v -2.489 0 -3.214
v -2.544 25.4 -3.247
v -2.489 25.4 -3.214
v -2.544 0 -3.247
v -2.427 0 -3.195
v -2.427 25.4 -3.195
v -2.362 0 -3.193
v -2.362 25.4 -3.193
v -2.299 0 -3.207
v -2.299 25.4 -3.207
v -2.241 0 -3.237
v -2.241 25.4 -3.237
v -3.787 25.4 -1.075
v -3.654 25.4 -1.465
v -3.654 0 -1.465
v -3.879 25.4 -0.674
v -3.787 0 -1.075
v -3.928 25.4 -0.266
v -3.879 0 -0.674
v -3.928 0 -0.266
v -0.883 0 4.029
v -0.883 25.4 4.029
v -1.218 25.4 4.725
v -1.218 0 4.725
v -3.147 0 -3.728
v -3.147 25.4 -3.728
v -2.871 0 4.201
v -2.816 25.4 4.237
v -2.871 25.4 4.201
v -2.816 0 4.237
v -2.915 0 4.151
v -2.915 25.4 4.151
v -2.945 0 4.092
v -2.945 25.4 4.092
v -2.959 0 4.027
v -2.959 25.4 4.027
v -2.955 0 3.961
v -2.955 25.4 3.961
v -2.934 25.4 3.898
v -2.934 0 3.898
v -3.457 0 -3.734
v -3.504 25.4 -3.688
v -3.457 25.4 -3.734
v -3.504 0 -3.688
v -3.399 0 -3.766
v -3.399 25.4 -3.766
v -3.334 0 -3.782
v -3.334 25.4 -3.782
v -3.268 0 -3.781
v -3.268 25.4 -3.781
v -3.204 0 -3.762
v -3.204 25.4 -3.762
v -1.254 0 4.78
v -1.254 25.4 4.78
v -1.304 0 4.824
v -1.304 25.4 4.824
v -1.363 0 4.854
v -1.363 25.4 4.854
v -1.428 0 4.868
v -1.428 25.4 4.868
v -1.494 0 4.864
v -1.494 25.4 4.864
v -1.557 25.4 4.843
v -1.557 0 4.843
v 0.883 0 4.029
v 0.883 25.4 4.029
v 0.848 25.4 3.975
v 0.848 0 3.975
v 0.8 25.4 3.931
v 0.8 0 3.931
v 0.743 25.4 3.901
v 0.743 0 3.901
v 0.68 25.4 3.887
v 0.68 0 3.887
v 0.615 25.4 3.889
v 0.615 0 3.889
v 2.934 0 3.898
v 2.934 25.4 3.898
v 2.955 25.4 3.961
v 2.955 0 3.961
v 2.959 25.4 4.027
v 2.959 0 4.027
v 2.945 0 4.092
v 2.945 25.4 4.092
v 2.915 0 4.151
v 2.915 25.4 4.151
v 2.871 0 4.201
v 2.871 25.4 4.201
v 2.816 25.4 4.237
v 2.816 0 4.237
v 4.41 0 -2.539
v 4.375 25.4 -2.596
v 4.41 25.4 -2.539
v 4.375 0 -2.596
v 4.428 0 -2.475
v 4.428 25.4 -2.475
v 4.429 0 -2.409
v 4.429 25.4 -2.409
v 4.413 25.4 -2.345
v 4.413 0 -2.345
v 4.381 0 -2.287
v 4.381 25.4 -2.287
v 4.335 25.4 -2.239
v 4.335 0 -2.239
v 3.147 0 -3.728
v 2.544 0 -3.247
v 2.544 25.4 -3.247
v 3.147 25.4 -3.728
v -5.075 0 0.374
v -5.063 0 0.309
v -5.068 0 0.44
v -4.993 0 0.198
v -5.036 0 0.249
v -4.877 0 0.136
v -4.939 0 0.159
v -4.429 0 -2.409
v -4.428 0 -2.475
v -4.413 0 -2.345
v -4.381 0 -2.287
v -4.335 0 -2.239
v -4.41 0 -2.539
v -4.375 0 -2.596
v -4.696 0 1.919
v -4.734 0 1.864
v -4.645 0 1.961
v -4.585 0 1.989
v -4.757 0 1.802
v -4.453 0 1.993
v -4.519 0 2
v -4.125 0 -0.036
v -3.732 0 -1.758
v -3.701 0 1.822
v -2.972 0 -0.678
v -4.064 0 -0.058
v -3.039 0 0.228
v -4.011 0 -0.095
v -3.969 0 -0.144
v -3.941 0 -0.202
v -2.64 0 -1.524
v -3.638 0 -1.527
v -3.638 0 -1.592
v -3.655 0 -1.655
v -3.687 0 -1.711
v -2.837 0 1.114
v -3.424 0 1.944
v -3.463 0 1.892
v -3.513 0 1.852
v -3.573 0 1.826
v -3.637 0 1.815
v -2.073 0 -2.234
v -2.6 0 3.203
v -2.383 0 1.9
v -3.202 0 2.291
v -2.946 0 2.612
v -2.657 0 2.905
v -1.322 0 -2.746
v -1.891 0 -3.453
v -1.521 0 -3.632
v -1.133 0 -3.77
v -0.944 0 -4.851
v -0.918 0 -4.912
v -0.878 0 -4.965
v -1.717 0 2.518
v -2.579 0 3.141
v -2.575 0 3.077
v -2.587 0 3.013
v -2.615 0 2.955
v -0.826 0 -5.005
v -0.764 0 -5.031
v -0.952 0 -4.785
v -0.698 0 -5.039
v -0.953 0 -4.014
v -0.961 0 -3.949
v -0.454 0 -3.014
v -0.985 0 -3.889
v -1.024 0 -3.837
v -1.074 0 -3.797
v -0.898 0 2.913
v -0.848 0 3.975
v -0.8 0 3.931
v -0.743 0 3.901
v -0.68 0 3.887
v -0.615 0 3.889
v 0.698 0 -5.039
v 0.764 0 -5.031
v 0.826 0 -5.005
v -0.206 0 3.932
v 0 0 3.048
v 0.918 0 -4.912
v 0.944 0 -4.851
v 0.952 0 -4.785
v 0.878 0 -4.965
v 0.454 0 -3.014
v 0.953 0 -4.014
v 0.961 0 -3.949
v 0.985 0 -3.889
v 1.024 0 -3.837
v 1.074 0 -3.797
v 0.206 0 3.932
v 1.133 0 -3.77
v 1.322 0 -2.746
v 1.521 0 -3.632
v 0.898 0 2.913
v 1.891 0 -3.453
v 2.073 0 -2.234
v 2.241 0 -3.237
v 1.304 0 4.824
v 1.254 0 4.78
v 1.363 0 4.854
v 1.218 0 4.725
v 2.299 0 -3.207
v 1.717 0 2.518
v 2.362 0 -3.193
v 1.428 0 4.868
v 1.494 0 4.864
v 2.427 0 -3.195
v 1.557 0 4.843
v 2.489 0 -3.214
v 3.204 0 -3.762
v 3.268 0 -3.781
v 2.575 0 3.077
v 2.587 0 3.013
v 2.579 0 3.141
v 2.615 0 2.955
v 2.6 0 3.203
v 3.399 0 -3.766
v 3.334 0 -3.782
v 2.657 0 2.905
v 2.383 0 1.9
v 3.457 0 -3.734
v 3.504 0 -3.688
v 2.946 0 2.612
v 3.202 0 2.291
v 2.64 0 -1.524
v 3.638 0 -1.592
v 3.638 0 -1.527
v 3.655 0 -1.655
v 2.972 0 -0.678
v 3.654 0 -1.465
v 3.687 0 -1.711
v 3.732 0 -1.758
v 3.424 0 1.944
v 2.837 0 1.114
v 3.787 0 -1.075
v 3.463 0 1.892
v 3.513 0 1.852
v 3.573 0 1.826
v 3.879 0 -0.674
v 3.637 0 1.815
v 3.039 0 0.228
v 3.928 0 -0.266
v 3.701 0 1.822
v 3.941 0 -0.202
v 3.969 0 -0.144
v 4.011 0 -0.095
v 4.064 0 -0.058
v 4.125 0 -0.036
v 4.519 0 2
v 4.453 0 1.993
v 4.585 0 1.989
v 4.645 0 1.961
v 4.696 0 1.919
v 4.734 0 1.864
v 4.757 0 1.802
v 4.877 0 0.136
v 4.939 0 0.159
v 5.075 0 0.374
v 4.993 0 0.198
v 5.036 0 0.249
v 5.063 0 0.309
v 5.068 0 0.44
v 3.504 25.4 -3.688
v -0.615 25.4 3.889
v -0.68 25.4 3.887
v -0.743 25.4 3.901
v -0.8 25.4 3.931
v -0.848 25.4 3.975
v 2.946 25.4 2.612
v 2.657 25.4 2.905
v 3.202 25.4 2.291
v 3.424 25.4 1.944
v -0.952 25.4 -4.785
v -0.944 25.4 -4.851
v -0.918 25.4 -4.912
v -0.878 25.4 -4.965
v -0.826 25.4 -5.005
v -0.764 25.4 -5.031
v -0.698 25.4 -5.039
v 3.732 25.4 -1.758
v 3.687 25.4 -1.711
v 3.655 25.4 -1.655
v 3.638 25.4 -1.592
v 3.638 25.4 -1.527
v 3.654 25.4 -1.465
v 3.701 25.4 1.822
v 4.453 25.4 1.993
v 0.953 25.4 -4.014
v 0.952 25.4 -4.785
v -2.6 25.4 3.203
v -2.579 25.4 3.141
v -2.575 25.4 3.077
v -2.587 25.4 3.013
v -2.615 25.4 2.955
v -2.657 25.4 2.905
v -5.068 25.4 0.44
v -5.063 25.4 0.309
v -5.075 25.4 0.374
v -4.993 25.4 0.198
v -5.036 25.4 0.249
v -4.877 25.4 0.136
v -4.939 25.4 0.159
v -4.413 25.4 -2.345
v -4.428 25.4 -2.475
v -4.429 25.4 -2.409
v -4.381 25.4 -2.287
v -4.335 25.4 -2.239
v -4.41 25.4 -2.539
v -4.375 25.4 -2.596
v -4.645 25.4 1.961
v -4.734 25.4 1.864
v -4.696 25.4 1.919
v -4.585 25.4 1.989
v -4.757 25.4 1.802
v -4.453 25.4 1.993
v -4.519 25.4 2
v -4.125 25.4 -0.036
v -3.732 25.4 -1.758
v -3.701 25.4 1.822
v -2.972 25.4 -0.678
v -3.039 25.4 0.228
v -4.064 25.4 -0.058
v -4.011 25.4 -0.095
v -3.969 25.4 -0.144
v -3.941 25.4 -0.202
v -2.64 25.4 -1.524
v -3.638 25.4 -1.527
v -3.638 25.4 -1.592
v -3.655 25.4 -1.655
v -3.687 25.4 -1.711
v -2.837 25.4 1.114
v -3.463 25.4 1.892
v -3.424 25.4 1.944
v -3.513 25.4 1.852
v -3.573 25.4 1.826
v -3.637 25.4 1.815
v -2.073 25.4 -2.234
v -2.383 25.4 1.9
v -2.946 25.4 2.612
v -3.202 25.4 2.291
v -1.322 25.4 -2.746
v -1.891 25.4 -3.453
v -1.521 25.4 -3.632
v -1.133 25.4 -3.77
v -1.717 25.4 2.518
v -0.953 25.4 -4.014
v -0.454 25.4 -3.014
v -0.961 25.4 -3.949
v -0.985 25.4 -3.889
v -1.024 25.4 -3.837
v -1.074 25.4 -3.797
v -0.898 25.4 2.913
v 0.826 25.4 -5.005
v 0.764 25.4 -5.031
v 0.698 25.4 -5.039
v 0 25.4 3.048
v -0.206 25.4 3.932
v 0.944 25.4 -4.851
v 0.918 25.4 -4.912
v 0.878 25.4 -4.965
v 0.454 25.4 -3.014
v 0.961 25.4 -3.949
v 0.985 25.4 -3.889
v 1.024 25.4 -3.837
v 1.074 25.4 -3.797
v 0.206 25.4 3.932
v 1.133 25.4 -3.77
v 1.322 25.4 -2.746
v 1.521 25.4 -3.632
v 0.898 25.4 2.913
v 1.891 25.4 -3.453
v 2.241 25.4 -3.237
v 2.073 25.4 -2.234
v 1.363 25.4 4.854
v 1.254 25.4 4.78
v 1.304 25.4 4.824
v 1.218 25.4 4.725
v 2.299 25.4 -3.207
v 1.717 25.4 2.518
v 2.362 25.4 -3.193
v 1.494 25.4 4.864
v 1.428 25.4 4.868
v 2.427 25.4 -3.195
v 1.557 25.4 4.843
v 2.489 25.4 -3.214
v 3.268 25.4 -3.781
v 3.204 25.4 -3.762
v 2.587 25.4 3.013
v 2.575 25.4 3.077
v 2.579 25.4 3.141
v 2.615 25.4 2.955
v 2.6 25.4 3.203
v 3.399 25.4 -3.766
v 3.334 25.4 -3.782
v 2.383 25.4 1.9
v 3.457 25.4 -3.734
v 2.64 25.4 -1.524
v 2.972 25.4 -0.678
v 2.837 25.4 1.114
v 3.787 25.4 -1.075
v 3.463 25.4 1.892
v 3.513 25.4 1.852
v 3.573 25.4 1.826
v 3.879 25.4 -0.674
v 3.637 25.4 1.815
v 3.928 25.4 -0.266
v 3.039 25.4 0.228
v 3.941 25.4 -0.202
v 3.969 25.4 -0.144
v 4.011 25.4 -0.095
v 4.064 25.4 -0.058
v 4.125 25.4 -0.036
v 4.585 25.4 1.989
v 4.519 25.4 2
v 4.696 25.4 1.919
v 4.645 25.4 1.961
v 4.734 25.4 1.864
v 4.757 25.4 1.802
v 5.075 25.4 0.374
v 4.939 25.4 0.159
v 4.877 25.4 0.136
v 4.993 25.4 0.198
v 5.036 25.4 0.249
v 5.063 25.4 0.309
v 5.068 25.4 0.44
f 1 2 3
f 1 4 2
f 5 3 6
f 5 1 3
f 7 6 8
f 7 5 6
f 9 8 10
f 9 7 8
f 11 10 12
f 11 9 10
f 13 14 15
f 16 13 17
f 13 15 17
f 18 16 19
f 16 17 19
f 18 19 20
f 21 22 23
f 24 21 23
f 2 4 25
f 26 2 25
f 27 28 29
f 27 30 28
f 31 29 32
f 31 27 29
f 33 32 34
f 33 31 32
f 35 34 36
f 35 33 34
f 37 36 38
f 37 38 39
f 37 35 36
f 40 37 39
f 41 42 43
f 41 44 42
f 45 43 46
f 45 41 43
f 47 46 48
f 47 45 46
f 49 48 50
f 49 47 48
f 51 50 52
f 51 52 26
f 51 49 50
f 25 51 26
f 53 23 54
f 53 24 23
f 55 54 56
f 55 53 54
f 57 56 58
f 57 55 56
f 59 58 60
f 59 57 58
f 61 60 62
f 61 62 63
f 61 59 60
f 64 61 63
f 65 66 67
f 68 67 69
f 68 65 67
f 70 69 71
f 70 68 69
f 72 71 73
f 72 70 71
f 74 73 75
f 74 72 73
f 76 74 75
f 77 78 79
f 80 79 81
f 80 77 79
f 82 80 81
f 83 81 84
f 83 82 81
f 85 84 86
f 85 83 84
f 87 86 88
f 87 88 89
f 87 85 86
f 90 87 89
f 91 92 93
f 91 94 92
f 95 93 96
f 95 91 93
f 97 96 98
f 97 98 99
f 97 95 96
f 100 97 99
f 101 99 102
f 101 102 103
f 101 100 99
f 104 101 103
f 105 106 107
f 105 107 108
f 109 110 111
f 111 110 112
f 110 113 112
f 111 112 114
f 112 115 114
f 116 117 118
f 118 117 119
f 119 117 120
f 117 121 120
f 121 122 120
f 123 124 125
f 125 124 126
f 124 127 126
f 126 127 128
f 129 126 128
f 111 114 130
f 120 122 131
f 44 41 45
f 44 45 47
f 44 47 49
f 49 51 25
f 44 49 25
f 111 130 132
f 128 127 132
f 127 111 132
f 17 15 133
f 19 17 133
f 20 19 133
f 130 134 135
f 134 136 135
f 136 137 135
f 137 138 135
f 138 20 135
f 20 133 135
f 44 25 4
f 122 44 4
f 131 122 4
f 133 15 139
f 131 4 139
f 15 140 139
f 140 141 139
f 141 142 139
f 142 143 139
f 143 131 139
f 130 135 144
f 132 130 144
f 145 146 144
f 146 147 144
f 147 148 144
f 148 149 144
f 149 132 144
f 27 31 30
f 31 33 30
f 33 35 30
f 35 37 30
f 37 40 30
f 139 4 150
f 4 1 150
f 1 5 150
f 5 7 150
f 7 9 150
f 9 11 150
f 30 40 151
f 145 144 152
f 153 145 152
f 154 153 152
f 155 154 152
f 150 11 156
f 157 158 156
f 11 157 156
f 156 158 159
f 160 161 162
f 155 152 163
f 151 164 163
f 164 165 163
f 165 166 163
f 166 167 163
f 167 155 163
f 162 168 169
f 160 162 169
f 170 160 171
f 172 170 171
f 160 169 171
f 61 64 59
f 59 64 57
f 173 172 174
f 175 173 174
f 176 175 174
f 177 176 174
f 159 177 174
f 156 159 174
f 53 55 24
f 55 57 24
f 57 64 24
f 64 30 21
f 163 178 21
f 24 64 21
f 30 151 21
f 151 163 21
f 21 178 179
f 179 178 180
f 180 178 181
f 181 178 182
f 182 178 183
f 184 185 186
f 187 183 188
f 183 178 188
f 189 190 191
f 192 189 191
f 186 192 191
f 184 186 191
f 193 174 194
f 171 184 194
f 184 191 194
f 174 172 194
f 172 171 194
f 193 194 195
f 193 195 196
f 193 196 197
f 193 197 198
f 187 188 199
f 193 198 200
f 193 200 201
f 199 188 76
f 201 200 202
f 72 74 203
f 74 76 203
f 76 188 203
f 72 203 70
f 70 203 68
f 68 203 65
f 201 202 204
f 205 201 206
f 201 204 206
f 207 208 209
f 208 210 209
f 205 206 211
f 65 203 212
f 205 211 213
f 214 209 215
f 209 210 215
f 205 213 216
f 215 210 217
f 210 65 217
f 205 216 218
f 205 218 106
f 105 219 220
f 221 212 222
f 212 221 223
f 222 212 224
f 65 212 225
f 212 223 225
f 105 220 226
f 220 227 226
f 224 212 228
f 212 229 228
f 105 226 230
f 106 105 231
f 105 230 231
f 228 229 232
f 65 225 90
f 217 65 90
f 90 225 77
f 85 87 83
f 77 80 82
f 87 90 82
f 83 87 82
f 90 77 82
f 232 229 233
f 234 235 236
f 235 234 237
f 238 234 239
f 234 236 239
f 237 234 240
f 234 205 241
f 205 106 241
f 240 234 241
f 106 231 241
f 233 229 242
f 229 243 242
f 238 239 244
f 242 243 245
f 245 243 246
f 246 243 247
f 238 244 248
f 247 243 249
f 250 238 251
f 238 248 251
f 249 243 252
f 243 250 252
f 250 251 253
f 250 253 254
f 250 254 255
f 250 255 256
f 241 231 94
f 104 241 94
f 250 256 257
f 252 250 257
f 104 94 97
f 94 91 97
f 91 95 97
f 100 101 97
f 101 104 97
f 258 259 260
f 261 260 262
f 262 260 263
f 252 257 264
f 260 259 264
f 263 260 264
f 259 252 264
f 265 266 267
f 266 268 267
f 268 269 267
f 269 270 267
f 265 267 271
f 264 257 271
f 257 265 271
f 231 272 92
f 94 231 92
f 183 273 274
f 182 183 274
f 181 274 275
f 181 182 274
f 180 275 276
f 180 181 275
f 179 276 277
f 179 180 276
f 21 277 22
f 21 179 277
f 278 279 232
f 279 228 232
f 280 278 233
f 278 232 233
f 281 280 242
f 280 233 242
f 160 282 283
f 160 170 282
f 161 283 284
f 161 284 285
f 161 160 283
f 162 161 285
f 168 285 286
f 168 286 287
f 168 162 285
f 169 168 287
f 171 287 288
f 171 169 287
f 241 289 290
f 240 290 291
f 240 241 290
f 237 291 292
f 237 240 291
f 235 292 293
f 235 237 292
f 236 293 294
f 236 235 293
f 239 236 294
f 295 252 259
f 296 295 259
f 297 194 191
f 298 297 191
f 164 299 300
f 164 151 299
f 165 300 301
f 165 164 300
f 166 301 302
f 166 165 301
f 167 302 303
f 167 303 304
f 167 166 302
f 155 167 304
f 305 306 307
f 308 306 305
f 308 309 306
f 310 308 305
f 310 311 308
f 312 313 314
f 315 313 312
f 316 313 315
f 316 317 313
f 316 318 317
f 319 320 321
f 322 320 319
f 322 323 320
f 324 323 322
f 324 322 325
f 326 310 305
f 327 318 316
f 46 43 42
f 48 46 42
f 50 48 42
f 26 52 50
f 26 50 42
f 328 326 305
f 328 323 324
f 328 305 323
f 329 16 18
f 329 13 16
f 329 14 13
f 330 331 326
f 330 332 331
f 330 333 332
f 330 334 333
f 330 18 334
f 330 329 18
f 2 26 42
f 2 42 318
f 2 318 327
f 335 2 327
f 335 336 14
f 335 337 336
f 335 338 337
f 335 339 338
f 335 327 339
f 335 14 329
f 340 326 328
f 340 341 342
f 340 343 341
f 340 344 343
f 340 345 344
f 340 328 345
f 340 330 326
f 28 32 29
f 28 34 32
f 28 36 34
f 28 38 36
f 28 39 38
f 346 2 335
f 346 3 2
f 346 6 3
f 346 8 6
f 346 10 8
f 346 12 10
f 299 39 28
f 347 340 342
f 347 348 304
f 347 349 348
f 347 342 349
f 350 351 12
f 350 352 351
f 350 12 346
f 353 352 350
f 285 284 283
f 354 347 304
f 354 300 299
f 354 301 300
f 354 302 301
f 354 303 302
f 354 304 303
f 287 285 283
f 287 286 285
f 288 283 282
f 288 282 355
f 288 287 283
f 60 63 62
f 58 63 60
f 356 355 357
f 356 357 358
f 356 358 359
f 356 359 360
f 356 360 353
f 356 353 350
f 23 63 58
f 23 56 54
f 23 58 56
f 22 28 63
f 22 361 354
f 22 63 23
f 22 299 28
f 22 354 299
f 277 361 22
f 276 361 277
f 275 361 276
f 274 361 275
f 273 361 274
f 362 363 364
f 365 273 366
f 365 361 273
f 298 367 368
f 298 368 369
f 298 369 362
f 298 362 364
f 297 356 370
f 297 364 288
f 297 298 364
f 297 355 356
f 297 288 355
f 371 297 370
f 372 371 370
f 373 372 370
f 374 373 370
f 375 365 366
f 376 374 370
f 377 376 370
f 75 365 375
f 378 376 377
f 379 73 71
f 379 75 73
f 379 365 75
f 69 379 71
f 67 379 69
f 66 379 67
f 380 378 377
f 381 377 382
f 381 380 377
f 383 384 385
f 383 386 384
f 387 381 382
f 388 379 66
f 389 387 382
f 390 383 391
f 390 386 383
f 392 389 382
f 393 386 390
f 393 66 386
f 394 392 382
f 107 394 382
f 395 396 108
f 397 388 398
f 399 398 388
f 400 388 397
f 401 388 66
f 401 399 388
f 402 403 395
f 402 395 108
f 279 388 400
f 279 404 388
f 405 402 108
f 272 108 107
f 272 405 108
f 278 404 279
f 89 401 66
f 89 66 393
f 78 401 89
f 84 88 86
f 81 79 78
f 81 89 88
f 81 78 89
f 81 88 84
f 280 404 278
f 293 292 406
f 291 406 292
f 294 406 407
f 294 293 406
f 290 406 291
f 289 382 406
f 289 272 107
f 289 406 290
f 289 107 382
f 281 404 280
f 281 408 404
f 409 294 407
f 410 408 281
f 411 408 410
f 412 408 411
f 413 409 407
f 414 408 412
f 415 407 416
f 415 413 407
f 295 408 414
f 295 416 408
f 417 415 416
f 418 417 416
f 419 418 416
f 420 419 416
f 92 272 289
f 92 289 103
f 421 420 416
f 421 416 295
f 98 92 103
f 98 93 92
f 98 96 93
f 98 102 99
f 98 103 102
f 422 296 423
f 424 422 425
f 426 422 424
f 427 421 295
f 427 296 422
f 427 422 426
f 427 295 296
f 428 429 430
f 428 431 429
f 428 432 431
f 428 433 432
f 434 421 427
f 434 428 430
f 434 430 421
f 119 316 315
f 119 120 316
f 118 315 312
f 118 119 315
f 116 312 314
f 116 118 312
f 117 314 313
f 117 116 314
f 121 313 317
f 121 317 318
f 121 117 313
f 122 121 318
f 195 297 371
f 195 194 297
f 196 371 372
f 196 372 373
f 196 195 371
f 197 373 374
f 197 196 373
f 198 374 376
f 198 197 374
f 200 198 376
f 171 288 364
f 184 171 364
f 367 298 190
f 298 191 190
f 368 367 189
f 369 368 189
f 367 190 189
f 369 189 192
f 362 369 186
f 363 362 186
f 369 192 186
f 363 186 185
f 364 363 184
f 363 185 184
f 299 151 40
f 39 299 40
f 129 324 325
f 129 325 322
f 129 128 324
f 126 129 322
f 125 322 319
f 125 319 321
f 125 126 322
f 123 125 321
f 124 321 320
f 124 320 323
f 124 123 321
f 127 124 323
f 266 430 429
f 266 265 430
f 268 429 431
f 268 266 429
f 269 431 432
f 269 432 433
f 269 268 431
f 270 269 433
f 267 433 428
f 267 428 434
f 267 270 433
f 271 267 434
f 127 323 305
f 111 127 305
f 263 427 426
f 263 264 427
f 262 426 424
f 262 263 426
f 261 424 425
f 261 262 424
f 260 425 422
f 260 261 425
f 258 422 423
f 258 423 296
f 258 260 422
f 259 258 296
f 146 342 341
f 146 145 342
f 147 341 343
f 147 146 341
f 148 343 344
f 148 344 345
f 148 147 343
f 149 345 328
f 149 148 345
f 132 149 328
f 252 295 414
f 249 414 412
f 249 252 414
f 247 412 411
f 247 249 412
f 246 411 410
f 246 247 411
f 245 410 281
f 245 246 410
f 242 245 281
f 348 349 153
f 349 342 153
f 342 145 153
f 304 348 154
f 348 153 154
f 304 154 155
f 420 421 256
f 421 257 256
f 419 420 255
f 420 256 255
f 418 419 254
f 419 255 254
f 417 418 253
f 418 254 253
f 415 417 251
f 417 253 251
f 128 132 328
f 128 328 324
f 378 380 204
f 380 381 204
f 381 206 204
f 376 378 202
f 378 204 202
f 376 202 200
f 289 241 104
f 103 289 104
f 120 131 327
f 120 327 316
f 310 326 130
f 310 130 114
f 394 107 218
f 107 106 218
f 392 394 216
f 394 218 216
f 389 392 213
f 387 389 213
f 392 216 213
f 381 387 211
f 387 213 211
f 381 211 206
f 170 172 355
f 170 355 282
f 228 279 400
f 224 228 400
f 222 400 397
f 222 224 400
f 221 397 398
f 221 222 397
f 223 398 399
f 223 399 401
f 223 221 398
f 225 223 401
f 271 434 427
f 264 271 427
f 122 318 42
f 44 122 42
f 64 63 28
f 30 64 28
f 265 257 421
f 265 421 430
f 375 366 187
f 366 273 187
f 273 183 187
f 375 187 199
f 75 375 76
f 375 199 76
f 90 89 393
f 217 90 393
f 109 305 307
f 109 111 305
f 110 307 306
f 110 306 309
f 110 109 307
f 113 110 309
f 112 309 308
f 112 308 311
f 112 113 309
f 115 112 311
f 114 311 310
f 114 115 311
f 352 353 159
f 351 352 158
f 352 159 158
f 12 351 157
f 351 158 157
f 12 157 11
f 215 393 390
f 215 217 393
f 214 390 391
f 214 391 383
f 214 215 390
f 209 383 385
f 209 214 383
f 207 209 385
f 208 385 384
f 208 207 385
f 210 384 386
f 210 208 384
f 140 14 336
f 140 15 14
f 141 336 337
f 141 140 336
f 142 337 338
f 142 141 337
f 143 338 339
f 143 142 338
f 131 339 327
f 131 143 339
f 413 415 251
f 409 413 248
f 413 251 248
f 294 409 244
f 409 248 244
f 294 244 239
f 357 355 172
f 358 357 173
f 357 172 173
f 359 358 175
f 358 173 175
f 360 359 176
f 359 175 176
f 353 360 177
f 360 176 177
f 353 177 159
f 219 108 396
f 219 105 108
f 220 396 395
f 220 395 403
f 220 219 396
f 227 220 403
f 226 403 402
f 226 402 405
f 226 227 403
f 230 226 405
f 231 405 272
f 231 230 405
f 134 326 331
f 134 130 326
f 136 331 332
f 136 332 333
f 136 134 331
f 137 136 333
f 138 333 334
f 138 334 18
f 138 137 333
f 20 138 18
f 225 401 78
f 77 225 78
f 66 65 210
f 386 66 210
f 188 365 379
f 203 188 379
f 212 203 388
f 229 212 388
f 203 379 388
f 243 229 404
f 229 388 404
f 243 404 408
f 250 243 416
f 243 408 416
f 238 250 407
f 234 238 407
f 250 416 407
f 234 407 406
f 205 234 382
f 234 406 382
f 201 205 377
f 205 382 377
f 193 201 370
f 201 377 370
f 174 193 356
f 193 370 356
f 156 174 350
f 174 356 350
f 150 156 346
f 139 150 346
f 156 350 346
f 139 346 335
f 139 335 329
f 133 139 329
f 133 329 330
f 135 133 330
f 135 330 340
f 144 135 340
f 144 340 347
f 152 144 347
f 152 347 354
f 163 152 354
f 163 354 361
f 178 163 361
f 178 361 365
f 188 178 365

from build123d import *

# Parameters (mm, degrees)
SKETCH1_R                = 3.937
BOSS_EXTRUDE1_DEPTH      = 25.4
SKETCH2_W                = 1.905
SKETCH2_H                = 1.2192
BOSS_EXTRUDE2_DEPTH      = 25.4
FILLET2_R                = 0.254
CIRPATTERN4_COUNT        = 7
FILLET2_OF_CIRPATTERN4_R = 0.254
SKETCH3_R                = 3.048
CUT_EXTRUDE1_DEPTH       = 27.387619956


with BuildPart() as part:
    # Sketch1 → Boss-Extrude1 (new body)
    with BuildSketch(Plane(origin=(0, 0, 0), x_dir=(1, 0, 0), z_dir=(0, 1, 0))):
        with Locations(Location((0, 0, 0), (0, 0, 270))):
            Circle(SKETCH1_R)
    extrude(amount=BOSS_EXTRUDE1_DEPTH)

    # Sketch2 → Boss-Extrude2 (add)
    with BuildSketch(Plane(origin=(0, 25.4, 0), x_dir=(1, 0, 0), z_dir=(0, 1, 0))):
        with Locations((0, 4.429640936)):
            Rectangle(SKETCH2_W, SKETCH2_H)
    boss_extrude2 = extrude(amount=-BOSS_EXTRUDE2_DEPTH)

    # Fillet2
    fillet2_edges = [part.edges().sort_by_distance(p)[0] for p in [
        (0.9525, 12.7, -5.039240936),
        (0.9525, 12.7, -3.820040936),
        (-0.9525, 12.7, -3.820040936),
        (-0.9525, 12.7, -5.039240936),
    ]]
    fillet(fillet2_edges, radius=FILLET2_R)

    # CirPattern4: Boss-Extrude2 ×7 about axis
    cirpattern4_axis = Axis((0, 0, 0), (0, 1, 0))
    for i in range(1, CIRPATTERN4_COUNT):
        add(boss_extrude2.rotate(cirpattern4_axis, i * 360 / CIRPATTERN4_COUNT))

    # Fillet2 of CirPattern4
    fillet2_of_cirpattern4_edges = [part.edges().sort_by_distance(p)[0] for p in [
        (-3.345963175, 12.7, -3.88660982),
        (-2.392754232, 12.7, -3.126451053),
        (-3.580502304, 12.7, -1.637062079),
        (-4.533711247, 12.7, -2.397220845),
        (-5.124847834, 12.7, 0.192717763),
        (-3.936215723, 12.7, -0.07857976),
        (-3.512313344, 12.7, 1.778657913),
        (-4.700945455, 12.7, 2.049955436),
        (-3.044617546, 12.7, 4.126924939),
        (-2.515626491, 12.7, 3.028463696),
        (-0.799280798, 12.7, 3.855012219),
        (-1.328271853, 12.7, 4.953473462),
        (1.328271853, 12.7, 4.953473462),
        (0.799280798, 12.7, 3.855012219),
        (2.515626491, 12.7, 3.028463696),
        (3.044617546, 12.7, 4.126924939),
        (4.700945455, 12.7, 2.049955436),
        (3.512313344, 12.7, 1.778657913),
        (3.936215723, 12.7, -0.07857976),
        (5.124847834, 12.7, 0.192717763),
        (4.533711247, 12.7, -2.397220845),
        (3.580502304, 12.7, -1.637062079),
        (2.392754232, 12.7, -3.126451053),
        (3.345963175, 12.7, -3.88660982),
    ]]
    fillet(fillet2_of_cirpattern4_edges, radius=FILLET2_OF_CIRPATTERN4_R)

    # Sketch3 → Cut-Extrude1 (cut, through all)
    with BuildSketch(Plane(origin=(0, 25.4, 0), x_dir=(1, 0, 0), z_dir=(0, 1, 0))):
        with Locations(Location((0, 0, 0), (0, 0, 270))):
            Circle(SKETCH3_R)
    extrude(amount=-CUT_EXTRUDE1_DEPTH, mode=Mode.SUBTRACT)


solid = part.part
